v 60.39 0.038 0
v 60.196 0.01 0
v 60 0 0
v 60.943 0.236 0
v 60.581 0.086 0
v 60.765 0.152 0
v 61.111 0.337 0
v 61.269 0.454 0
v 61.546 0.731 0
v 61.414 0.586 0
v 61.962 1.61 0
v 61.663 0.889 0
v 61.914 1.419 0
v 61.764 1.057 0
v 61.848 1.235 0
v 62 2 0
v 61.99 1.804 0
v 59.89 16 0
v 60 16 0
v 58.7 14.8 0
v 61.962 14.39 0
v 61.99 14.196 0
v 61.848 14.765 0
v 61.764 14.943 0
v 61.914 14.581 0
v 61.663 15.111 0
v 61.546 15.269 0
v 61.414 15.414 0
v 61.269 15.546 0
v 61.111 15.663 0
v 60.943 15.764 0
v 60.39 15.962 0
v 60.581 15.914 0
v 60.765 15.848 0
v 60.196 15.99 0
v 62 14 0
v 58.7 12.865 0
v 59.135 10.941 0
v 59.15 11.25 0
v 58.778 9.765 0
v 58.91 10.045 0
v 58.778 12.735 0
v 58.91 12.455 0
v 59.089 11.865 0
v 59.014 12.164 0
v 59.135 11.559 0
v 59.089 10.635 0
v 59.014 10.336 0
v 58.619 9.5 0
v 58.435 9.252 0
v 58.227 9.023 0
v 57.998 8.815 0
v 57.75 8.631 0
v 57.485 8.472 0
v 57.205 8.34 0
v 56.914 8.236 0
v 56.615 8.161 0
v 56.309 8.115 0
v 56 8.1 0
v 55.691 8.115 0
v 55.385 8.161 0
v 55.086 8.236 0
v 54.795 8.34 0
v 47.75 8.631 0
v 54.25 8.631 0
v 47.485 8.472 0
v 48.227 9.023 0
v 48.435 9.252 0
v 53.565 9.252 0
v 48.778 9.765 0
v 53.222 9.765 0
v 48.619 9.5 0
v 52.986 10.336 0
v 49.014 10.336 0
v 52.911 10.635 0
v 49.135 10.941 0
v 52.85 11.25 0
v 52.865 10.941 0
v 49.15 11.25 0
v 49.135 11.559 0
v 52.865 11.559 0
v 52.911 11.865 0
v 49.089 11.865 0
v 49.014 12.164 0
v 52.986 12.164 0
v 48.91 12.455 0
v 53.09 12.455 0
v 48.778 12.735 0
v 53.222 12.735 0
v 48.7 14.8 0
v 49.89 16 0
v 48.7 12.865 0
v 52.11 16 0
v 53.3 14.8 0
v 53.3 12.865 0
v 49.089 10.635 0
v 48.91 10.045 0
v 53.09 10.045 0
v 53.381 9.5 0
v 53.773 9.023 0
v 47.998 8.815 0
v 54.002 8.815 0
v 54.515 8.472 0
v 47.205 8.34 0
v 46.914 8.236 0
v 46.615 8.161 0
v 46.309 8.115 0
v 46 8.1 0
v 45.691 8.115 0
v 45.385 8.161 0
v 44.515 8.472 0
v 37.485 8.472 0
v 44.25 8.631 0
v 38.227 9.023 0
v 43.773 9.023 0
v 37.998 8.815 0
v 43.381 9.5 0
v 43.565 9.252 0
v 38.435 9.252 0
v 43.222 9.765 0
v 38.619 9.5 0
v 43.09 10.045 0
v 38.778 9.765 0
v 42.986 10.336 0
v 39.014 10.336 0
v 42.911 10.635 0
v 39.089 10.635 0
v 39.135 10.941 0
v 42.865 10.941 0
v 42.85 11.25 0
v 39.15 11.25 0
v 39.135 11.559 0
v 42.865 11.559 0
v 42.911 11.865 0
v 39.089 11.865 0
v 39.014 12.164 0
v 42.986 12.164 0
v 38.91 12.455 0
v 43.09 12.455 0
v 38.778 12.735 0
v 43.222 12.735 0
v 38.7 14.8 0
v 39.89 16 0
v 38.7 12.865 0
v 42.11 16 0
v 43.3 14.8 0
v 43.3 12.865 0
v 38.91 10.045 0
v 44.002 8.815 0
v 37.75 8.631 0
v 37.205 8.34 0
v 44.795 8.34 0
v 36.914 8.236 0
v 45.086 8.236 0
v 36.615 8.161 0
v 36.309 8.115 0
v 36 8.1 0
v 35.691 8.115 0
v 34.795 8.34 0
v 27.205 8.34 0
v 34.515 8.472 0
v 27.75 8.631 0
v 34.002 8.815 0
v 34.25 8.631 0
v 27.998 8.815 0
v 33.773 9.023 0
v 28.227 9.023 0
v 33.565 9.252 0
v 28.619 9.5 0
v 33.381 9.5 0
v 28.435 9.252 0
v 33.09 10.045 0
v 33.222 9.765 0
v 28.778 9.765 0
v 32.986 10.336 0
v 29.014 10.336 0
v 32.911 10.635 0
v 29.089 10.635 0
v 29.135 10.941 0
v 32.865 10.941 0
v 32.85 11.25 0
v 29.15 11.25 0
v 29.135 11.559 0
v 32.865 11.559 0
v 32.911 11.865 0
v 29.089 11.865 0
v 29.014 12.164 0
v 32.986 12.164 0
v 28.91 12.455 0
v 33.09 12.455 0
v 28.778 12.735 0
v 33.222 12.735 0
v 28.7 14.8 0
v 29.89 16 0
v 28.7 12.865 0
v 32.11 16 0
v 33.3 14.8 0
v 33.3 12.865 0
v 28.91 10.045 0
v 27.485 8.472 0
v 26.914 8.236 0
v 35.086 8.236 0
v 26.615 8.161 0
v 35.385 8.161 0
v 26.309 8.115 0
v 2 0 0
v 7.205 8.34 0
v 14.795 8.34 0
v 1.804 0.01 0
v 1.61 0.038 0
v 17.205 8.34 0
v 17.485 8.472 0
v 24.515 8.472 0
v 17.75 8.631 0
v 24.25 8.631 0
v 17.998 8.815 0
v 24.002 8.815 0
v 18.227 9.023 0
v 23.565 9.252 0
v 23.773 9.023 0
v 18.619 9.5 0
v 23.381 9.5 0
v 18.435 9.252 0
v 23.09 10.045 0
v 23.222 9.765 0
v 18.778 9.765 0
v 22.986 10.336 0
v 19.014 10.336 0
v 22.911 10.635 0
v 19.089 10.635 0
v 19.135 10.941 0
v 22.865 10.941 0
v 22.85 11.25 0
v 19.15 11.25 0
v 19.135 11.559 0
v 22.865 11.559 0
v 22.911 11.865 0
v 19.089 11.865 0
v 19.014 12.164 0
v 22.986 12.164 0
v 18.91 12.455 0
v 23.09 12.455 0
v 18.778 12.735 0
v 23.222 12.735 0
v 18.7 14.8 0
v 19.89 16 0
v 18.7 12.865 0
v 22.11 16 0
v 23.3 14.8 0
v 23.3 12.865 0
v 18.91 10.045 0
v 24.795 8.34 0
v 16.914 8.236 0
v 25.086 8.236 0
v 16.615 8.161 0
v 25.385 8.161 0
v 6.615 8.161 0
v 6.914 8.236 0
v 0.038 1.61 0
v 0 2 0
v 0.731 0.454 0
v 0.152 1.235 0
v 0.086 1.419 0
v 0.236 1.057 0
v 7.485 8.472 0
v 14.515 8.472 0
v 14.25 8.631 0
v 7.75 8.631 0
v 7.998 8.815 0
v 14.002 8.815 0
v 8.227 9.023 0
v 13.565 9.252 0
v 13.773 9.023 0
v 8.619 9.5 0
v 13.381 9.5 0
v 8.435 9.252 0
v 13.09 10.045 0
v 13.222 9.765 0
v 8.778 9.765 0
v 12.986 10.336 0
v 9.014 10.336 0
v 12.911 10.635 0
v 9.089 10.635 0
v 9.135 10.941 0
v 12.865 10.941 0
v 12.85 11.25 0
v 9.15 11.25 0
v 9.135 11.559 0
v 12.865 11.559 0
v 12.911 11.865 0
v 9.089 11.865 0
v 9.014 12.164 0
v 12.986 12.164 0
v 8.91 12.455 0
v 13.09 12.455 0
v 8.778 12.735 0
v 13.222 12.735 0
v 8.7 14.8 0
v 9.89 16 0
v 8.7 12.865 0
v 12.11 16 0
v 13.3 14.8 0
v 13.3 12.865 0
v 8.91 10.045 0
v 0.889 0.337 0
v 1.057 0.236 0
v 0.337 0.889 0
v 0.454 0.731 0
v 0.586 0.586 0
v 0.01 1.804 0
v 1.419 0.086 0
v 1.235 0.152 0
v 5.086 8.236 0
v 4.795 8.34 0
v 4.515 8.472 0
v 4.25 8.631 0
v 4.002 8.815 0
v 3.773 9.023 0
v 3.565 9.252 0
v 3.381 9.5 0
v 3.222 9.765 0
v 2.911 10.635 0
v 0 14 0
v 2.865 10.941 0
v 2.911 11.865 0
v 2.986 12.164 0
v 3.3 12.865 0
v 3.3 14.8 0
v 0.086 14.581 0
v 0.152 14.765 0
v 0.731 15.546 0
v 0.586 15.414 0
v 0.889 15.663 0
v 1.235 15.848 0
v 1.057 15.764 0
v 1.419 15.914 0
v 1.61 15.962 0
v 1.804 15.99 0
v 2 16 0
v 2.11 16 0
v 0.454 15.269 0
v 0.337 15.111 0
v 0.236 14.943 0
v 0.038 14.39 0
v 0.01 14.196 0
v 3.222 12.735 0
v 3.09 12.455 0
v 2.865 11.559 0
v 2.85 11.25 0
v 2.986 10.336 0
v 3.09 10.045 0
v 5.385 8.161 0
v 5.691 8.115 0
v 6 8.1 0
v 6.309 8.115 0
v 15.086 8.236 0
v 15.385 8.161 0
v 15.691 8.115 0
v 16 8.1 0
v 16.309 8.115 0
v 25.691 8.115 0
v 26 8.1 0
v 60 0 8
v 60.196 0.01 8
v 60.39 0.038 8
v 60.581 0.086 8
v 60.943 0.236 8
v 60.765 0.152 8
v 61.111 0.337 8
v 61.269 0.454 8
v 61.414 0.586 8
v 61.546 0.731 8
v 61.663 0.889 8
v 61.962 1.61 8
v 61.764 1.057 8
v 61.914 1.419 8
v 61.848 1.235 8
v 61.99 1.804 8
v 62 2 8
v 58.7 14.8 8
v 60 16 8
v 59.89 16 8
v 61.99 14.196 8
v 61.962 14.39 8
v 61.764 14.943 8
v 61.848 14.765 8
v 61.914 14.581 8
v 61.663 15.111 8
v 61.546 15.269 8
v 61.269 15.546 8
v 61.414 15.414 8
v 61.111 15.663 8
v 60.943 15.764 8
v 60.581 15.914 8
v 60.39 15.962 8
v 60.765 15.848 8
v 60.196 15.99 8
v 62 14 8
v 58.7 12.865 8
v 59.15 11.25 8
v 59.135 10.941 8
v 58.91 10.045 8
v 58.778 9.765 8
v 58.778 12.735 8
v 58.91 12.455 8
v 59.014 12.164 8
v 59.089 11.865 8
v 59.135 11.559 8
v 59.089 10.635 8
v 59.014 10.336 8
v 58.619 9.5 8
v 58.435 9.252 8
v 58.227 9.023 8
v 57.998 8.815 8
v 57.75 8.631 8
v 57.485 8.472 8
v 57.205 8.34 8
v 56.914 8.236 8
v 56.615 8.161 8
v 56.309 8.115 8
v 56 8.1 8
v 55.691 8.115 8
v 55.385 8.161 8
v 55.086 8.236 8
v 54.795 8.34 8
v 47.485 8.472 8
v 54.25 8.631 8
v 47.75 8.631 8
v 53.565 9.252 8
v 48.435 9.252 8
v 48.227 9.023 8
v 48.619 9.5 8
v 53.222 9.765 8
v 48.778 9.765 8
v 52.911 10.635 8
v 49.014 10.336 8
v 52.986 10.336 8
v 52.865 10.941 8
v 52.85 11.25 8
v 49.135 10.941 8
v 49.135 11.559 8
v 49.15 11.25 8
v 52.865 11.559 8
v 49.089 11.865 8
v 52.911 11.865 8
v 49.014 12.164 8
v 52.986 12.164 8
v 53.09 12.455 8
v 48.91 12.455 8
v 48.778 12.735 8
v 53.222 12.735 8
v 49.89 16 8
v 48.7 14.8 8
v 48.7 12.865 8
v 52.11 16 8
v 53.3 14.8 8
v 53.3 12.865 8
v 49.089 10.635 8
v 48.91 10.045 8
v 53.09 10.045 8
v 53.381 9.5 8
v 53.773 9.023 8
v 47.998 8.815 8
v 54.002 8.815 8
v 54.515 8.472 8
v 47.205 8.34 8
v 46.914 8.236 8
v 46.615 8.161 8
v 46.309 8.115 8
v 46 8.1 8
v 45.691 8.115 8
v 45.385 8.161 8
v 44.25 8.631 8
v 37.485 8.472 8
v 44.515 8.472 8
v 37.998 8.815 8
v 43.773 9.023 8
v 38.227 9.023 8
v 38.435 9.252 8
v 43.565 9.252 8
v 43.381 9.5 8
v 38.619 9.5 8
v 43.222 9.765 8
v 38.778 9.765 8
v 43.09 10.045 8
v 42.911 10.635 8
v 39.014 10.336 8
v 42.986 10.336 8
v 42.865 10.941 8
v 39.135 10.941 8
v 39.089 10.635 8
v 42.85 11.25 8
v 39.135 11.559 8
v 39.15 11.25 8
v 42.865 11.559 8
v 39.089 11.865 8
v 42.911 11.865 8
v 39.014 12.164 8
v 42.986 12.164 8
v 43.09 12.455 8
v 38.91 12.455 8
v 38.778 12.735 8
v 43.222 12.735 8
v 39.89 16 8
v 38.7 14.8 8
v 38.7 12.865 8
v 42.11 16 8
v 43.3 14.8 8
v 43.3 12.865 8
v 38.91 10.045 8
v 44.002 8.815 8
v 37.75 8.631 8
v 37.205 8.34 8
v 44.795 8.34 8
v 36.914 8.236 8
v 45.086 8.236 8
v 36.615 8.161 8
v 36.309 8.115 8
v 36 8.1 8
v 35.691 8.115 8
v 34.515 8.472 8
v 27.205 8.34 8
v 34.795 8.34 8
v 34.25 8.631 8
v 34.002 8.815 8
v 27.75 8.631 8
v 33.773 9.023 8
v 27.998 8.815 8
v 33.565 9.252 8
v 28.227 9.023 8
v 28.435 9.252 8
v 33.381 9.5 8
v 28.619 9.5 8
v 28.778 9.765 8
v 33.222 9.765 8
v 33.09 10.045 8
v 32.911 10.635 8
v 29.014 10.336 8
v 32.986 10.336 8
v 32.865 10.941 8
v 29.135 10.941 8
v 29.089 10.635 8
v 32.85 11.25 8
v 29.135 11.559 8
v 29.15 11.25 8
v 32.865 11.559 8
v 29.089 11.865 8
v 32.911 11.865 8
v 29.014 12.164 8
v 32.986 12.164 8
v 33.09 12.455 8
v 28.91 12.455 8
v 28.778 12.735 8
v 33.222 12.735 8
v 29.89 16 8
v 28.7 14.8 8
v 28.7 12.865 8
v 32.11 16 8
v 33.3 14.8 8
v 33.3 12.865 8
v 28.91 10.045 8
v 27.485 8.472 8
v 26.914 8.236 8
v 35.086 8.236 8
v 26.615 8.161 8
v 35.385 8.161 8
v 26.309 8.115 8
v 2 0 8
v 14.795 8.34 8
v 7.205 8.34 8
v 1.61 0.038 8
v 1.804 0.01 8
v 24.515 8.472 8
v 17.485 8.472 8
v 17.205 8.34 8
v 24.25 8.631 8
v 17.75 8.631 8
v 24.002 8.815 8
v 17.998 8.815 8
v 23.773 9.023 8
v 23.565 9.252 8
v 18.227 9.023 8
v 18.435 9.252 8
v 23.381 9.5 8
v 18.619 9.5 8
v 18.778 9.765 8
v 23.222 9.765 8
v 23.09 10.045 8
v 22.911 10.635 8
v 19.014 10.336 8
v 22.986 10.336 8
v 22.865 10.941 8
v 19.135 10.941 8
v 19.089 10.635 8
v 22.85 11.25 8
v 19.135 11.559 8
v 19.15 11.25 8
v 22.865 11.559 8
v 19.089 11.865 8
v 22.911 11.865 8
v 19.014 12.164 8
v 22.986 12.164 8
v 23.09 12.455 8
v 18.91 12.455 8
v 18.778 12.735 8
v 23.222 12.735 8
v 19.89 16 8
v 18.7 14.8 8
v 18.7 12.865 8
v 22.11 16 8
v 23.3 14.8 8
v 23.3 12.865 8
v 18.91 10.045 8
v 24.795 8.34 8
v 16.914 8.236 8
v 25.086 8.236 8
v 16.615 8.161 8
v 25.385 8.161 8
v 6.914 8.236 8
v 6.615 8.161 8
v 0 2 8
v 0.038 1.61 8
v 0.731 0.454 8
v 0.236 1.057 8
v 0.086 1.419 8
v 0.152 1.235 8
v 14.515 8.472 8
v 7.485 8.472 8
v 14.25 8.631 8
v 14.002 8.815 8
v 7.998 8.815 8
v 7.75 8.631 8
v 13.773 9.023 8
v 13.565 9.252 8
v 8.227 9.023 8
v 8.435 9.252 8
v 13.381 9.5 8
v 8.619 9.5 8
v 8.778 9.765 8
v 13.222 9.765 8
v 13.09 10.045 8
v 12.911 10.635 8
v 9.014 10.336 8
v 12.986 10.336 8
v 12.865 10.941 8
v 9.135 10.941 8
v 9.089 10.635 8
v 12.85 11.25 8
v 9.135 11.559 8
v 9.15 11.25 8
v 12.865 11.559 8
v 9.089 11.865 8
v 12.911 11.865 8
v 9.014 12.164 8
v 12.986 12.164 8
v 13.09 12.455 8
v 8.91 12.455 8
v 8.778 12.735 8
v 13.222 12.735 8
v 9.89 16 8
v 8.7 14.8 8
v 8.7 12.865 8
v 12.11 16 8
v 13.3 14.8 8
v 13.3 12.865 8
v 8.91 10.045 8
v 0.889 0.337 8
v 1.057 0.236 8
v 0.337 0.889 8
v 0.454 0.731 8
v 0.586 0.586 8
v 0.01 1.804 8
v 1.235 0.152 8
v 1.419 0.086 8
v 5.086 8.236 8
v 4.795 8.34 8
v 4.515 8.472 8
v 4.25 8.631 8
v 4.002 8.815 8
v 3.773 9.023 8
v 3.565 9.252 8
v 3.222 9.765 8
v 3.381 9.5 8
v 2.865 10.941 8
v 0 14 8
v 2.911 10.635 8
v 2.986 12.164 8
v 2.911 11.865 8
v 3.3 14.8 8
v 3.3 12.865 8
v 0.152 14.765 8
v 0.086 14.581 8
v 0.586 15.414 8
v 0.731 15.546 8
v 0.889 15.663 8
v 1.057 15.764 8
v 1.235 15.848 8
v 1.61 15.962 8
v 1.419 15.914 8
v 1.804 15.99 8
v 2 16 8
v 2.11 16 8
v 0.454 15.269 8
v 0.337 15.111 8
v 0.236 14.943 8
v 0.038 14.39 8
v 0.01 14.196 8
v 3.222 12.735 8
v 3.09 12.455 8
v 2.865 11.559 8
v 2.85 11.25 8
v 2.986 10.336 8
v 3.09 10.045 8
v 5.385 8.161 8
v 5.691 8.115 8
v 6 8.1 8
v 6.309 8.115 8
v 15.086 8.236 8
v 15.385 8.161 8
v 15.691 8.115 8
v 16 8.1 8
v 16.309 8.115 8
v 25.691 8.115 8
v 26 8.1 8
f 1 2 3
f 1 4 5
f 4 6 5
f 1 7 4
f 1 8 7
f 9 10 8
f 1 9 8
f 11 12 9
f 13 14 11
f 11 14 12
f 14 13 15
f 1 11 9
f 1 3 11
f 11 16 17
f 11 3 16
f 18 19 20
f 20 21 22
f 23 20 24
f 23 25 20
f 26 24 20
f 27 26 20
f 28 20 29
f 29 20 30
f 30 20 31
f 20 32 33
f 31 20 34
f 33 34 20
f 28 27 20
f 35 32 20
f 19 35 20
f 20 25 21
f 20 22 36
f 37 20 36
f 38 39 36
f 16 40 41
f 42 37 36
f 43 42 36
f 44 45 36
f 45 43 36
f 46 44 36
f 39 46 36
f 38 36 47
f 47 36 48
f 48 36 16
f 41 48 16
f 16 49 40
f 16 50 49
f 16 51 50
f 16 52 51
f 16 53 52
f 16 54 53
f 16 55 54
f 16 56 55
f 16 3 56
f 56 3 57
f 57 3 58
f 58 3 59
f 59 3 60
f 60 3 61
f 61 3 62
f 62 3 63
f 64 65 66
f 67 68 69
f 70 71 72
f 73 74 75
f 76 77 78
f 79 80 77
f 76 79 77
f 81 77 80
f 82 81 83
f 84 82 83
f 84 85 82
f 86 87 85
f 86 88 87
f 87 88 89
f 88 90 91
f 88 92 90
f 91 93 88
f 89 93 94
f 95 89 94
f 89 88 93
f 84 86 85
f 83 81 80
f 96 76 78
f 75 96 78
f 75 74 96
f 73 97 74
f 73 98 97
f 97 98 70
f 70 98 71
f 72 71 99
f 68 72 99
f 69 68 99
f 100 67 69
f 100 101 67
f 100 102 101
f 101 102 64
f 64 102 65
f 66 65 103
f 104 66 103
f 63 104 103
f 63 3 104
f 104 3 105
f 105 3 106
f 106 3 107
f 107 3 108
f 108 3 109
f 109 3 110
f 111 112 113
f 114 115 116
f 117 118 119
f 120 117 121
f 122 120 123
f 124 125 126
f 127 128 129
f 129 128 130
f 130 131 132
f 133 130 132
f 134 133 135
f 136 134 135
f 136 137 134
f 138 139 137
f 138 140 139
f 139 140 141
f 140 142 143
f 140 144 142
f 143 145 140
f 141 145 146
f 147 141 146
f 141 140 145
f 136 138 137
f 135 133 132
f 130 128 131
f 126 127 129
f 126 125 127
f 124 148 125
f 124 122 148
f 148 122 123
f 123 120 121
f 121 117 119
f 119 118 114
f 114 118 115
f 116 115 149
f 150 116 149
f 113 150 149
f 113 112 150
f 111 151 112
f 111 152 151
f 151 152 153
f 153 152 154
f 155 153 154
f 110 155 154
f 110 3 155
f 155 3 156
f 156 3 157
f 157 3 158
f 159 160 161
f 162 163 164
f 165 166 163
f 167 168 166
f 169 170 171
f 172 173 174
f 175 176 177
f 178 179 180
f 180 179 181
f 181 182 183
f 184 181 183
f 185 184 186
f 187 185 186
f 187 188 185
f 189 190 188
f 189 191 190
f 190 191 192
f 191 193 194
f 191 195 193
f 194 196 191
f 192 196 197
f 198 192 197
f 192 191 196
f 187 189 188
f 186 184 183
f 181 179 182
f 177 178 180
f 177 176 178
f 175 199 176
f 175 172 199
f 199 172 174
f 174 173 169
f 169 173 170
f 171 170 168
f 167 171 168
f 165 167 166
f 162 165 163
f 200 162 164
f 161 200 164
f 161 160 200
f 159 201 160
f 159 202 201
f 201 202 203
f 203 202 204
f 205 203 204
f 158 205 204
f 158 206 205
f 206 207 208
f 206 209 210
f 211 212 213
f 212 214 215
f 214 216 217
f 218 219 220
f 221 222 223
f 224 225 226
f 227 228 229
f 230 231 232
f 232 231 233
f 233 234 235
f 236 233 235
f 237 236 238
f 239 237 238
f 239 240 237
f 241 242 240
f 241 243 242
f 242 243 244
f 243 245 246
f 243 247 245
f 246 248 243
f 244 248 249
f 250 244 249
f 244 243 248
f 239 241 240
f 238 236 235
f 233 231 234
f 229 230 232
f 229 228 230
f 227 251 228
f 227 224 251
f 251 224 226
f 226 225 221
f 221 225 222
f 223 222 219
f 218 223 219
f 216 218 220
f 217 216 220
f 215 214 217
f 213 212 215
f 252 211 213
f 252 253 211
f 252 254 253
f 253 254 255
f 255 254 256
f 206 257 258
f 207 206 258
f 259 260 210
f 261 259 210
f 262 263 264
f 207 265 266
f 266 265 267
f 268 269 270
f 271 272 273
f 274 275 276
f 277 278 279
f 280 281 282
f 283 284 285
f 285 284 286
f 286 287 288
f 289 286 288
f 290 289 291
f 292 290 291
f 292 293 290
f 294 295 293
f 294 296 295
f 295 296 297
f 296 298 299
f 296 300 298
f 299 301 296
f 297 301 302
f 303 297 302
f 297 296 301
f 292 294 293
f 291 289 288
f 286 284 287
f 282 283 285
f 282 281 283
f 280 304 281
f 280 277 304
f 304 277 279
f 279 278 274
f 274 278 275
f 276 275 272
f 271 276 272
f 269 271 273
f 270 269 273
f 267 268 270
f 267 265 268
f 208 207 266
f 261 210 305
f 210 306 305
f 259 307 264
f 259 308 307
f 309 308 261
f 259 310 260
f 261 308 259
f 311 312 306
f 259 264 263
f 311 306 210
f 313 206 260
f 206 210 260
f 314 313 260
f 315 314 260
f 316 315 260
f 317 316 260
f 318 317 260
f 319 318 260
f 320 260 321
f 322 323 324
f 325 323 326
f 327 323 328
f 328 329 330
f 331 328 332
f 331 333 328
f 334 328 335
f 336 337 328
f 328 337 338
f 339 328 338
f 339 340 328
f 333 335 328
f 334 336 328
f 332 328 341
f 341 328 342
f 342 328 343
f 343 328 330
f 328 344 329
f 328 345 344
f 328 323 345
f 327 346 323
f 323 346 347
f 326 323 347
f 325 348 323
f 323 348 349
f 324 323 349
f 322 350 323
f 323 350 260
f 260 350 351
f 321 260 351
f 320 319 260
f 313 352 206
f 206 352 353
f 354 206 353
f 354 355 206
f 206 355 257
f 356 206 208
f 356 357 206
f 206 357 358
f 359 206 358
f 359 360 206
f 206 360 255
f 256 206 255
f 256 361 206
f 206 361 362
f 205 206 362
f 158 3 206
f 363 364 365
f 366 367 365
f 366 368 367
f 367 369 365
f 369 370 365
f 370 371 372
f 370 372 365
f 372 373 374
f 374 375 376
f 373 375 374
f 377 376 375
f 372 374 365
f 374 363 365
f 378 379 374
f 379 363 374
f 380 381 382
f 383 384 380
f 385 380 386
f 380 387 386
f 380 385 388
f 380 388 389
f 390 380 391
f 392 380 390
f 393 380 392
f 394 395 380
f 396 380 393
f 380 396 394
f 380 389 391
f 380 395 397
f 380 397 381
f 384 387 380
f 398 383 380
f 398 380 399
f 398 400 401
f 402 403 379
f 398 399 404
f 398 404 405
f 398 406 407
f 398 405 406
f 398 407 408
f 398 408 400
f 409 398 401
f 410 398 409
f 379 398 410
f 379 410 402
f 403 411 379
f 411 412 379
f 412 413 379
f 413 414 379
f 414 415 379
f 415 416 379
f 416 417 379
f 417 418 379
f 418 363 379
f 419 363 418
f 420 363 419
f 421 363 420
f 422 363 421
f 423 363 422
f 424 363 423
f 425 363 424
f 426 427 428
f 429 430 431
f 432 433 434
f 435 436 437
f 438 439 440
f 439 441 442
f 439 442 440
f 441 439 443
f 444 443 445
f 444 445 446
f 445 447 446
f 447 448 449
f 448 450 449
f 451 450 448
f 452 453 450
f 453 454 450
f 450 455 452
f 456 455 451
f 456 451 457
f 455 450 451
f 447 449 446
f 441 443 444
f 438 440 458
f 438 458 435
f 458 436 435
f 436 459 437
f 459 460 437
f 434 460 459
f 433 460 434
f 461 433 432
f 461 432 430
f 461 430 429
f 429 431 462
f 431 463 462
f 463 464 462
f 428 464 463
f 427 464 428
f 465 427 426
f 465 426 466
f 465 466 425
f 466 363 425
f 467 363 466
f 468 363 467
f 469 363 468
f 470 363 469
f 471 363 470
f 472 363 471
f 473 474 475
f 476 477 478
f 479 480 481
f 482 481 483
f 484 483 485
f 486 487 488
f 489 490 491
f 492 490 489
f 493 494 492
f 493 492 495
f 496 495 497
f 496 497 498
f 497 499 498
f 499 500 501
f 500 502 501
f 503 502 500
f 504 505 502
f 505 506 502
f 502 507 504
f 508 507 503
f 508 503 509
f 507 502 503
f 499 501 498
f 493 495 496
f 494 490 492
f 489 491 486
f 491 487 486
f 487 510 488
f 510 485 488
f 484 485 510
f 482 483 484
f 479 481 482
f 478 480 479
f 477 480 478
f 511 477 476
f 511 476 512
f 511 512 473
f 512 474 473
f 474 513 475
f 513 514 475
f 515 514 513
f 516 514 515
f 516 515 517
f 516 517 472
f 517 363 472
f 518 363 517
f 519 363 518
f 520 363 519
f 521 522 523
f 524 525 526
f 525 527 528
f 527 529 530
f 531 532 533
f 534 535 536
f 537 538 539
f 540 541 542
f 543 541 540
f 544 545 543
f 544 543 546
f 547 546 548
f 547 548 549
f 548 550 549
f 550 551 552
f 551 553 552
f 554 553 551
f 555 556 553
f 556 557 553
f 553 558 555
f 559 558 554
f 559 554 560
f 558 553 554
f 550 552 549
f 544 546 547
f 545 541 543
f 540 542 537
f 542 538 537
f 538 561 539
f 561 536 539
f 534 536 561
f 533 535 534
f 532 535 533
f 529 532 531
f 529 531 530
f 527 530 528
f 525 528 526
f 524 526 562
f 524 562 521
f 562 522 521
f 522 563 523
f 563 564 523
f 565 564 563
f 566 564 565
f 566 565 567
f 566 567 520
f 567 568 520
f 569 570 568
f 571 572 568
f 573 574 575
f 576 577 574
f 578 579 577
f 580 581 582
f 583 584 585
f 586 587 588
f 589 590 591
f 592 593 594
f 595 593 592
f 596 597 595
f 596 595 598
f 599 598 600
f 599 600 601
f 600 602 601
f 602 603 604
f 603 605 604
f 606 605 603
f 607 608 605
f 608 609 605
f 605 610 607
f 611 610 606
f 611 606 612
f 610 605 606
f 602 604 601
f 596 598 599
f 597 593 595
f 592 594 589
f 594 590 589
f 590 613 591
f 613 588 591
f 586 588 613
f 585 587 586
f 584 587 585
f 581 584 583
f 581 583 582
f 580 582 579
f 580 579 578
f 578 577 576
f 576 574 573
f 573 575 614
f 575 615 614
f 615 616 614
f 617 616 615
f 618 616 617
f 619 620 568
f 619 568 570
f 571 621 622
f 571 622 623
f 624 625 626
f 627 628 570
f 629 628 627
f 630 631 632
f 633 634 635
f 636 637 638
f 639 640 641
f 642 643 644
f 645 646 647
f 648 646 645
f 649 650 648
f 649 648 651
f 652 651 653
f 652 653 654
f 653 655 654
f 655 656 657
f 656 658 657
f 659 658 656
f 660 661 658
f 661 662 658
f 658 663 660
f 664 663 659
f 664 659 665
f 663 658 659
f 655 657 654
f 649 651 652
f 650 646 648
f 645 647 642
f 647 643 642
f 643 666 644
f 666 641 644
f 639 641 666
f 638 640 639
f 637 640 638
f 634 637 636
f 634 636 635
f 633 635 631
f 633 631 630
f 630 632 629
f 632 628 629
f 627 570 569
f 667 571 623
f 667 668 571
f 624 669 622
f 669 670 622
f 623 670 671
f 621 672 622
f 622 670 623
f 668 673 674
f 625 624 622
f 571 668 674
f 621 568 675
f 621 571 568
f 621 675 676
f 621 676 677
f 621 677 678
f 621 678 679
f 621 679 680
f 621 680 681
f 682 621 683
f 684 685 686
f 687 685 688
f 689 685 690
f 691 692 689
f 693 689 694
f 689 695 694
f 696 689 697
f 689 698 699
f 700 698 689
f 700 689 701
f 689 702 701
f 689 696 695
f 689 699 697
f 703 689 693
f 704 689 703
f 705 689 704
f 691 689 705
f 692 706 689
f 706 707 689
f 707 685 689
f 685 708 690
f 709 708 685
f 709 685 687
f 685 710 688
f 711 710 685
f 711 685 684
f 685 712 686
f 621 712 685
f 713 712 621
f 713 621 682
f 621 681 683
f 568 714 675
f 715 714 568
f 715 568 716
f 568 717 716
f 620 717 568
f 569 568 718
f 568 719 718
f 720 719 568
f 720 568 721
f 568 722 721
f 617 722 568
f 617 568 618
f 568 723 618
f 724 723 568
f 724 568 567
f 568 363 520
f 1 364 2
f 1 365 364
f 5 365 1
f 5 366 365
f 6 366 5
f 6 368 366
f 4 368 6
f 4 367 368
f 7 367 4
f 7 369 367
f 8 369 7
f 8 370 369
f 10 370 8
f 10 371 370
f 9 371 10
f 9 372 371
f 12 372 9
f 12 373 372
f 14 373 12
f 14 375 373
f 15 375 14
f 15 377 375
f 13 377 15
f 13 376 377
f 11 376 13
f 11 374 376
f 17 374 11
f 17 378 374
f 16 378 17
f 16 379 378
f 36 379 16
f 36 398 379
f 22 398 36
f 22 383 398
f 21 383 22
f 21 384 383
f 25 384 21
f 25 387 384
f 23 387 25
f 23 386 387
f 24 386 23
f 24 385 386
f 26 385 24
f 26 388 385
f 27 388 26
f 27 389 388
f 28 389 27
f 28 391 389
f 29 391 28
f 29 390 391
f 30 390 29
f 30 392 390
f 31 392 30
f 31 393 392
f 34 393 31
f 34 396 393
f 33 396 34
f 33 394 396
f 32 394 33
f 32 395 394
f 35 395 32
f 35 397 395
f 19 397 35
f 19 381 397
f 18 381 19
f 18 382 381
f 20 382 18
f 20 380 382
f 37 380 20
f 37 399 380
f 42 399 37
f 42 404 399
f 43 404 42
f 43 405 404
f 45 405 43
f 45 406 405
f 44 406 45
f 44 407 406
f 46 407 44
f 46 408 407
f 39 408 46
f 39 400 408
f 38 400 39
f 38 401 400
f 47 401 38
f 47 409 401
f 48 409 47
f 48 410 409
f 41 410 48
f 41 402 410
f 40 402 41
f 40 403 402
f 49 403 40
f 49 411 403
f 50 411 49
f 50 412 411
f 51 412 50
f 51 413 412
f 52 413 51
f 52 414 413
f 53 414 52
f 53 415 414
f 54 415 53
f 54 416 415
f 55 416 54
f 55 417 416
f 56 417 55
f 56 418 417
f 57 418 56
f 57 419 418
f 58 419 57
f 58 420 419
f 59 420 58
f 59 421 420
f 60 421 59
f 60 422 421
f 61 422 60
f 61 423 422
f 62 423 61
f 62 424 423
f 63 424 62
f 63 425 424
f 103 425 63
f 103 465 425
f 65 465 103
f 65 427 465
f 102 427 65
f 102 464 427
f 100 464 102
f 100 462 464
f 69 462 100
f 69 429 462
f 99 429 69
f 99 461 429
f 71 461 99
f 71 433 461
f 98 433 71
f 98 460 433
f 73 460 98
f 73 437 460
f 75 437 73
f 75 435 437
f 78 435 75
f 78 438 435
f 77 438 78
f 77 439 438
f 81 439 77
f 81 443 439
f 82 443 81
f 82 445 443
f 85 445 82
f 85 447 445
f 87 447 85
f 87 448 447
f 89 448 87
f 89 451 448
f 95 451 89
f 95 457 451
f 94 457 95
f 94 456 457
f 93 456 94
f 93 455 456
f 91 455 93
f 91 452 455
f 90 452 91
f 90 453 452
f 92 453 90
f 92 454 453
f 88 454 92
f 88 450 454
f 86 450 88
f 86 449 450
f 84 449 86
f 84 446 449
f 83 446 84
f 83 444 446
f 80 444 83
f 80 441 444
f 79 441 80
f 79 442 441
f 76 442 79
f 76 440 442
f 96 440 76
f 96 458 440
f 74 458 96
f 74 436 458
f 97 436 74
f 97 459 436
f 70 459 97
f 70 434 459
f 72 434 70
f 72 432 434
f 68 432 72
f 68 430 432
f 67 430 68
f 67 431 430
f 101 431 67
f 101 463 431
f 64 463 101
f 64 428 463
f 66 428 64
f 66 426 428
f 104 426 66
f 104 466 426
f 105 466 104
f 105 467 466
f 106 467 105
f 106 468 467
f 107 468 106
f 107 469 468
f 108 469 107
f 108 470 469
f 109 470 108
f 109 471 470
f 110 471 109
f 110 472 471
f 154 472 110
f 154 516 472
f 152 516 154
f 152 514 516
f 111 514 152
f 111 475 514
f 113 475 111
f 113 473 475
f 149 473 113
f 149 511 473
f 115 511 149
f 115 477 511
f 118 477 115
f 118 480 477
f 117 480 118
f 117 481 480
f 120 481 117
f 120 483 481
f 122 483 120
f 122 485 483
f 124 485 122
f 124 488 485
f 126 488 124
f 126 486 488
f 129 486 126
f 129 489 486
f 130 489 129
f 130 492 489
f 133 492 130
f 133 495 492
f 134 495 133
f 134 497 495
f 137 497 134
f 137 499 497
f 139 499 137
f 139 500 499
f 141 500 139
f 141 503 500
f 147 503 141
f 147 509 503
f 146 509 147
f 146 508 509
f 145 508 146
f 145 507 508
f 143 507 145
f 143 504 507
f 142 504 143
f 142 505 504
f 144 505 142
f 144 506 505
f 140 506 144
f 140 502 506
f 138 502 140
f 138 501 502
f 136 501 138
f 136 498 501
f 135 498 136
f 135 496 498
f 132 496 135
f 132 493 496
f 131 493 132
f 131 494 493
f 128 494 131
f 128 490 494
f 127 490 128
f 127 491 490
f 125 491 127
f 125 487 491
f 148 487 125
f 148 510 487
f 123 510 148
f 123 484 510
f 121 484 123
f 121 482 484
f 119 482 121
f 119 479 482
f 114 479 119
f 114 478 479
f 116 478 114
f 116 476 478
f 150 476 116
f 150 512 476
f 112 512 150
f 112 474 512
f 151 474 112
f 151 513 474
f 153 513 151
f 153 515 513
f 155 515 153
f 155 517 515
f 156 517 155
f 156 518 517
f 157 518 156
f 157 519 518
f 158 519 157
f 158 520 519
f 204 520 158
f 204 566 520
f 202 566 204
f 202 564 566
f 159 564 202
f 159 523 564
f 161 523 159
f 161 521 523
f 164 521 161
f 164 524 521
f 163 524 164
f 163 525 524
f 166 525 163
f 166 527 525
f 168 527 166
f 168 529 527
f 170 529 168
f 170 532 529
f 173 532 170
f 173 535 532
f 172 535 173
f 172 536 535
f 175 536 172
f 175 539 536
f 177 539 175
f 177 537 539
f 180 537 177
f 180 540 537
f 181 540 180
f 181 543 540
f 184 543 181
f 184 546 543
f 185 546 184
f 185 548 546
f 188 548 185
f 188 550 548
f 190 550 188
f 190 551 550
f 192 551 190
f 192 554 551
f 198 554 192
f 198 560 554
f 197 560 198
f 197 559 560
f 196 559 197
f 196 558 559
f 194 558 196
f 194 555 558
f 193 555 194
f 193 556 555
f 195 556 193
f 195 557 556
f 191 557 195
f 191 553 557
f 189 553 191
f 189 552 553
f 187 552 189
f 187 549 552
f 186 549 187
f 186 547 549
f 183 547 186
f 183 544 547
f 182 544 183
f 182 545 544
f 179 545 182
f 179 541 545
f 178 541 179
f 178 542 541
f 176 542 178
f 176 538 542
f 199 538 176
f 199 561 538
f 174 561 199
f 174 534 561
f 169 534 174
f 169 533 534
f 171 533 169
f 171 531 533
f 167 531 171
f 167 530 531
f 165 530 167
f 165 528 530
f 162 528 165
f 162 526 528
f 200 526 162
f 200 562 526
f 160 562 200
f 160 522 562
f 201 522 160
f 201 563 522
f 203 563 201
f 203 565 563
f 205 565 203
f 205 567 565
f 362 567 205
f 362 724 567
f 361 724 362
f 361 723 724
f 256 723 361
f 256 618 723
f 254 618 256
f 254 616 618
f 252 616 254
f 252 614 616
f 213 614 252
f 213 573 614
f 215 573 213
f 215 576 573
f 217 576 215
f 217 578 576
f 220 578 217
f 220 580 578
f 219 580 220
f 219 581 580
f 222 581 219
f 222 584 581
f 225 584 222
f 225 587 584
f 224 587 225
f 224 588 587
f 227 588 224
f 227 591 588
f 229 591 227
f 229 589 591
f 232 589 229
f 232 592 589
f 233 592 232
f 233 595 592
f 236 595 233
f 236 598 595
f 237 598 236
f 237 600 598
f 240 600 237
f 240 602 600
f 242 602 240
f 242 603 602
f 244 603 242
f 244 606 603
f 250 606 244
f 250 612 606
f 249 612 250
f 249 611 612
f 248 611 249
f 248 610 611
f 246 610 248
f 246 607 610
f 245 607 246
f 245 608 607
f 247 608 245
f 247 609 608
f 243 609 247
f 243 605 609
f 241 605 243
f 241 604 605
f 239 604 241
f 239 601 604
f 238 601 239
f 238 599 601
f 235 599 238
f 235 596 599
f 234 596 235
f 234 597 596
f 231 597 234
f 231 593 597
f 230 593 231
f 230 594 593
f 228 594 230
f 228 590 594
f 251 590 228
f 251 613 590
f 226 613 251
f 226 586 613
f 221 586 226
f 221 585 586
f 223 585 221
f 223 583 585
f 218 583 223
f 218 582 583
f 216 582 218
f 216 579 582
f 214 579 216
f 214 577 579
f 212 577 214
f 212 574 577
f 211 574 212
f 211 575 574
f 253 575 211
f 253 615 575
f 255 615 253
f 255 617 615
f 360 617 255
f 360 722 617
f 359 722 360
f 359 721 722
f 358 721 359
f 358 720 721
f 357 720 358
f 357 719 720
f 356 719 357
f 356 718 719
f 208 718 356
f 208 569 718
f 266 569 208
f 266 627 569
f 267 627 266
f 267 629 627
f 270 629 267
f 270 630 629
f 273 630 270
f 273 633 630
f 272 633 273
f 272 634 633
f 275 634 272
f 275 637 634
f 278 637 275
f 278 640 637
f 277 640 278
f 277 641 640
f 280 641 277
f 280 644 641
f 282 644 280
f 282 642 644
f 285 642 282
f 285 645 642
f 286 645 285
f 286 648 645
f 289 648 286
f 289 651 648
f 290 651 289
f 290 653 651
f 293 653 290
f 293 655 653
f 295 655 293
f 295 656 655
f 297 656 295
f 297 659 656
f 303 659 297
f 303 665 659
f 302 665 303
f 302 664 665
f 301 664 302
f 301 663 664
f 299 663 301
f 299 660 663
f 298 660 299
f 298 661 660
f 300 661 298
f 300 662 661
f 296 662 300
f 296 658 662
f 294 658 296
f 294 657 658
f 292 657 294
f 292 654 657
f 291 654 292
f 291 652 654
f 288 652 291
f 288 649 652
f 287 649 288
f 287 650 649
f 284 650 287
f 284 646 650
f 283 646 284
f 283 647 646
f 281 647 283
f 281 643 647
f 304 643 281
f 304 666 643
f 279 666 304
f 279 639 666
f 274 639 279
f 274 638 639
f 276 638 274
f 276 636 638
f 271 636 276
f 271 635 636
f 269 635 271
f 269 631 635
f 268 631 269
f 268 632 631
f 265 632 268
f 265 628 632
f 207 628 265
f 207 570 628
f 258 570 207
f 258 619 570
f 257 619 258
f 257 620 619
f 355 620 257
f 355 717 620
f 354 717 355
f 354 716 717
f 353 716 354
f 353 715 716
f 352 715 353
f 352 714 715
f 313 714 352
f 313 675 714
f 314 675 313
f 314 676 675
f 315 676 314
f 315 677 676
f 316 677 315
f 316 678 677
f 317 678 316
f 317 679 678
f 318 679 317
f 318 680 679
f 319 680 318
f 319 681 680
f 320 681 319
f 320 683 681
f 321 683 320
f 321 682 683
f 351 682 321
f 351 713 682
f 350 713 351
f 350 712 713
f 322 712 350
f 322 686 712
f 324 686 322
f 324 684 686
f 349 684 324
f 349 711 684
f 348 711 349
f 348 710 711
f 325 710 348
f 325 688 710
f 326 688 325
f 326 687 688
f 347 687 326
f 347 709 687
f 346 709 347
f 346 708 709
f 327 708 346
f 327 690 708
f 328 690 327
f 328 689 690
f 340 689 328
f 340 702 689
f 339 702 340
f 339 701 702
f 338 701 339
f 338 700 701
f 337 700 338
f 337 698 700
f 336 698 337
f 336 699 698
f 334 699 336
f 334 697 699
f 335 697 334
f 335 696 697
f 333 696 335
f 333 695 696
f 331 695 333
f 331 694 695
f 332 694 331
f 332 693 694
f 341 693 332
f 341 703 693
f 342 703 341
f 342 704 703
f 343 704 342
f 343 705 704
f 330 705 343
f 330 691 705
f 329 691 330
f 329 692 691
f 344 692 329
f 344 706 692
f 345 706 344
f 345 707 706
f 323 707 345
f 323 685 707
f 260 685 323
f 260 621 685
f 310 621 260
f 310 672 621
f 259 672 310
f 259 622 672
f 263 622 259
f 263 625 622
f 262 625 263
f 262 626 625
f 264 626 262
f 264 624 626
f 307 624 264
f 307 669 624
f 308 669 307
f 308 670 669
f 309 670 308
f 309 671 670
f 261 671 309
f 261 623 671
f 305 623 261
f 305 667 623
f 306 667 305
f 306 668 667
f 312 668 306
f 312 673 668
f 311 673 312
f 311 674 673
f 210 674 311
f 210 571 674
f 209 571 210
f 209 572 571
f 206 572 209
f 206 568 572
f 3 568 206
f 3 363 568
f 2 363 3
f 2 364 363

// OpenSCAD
// Cable comb for 6 cables of 6 mm, 10 mm apart, cables click in.
cables = 6;
cable_d = 6;
pitch = 10;
slot_d = cable_d + 0.3;     // seat
mouth = cable_d - 0.6;      // narrower mouth so the cable clicks in
lead_in = 1.2;
margin = 6;
length = (cables - 1) * pitch + 2 * margin;   // 62
depth = 16;                 // Y, slots open on +Y
height = 8;                 // Z, plate thickness
seat_y = depth - slot_d / 2 - 1.6;
$fn = 64;

module slot() {
    circle(d = slot_d);
    // mouth straight section then a lead-in chamfer at the edge
    polygon([
        [-mouth / 2, 0], [mouth / 2, 0],
        [mouth / 2, depth - seat_y - lead_in],
        [mouth / 2 + lead_in, depth - seat_y + 0.01],
        [-mouth / 2 - lead_in, depth - seat_y + 0.01],
        [-mouth / 2, depth - seat_y - lead_in]
    ]);
}

linear_extrude(height)
difference() {
    offset(r = 2) offset(delta = -2) square([length, depth]);
    for (i = [0:cables - 1])
        translate([margin + i * pitch, seat_y]) slot();
}
